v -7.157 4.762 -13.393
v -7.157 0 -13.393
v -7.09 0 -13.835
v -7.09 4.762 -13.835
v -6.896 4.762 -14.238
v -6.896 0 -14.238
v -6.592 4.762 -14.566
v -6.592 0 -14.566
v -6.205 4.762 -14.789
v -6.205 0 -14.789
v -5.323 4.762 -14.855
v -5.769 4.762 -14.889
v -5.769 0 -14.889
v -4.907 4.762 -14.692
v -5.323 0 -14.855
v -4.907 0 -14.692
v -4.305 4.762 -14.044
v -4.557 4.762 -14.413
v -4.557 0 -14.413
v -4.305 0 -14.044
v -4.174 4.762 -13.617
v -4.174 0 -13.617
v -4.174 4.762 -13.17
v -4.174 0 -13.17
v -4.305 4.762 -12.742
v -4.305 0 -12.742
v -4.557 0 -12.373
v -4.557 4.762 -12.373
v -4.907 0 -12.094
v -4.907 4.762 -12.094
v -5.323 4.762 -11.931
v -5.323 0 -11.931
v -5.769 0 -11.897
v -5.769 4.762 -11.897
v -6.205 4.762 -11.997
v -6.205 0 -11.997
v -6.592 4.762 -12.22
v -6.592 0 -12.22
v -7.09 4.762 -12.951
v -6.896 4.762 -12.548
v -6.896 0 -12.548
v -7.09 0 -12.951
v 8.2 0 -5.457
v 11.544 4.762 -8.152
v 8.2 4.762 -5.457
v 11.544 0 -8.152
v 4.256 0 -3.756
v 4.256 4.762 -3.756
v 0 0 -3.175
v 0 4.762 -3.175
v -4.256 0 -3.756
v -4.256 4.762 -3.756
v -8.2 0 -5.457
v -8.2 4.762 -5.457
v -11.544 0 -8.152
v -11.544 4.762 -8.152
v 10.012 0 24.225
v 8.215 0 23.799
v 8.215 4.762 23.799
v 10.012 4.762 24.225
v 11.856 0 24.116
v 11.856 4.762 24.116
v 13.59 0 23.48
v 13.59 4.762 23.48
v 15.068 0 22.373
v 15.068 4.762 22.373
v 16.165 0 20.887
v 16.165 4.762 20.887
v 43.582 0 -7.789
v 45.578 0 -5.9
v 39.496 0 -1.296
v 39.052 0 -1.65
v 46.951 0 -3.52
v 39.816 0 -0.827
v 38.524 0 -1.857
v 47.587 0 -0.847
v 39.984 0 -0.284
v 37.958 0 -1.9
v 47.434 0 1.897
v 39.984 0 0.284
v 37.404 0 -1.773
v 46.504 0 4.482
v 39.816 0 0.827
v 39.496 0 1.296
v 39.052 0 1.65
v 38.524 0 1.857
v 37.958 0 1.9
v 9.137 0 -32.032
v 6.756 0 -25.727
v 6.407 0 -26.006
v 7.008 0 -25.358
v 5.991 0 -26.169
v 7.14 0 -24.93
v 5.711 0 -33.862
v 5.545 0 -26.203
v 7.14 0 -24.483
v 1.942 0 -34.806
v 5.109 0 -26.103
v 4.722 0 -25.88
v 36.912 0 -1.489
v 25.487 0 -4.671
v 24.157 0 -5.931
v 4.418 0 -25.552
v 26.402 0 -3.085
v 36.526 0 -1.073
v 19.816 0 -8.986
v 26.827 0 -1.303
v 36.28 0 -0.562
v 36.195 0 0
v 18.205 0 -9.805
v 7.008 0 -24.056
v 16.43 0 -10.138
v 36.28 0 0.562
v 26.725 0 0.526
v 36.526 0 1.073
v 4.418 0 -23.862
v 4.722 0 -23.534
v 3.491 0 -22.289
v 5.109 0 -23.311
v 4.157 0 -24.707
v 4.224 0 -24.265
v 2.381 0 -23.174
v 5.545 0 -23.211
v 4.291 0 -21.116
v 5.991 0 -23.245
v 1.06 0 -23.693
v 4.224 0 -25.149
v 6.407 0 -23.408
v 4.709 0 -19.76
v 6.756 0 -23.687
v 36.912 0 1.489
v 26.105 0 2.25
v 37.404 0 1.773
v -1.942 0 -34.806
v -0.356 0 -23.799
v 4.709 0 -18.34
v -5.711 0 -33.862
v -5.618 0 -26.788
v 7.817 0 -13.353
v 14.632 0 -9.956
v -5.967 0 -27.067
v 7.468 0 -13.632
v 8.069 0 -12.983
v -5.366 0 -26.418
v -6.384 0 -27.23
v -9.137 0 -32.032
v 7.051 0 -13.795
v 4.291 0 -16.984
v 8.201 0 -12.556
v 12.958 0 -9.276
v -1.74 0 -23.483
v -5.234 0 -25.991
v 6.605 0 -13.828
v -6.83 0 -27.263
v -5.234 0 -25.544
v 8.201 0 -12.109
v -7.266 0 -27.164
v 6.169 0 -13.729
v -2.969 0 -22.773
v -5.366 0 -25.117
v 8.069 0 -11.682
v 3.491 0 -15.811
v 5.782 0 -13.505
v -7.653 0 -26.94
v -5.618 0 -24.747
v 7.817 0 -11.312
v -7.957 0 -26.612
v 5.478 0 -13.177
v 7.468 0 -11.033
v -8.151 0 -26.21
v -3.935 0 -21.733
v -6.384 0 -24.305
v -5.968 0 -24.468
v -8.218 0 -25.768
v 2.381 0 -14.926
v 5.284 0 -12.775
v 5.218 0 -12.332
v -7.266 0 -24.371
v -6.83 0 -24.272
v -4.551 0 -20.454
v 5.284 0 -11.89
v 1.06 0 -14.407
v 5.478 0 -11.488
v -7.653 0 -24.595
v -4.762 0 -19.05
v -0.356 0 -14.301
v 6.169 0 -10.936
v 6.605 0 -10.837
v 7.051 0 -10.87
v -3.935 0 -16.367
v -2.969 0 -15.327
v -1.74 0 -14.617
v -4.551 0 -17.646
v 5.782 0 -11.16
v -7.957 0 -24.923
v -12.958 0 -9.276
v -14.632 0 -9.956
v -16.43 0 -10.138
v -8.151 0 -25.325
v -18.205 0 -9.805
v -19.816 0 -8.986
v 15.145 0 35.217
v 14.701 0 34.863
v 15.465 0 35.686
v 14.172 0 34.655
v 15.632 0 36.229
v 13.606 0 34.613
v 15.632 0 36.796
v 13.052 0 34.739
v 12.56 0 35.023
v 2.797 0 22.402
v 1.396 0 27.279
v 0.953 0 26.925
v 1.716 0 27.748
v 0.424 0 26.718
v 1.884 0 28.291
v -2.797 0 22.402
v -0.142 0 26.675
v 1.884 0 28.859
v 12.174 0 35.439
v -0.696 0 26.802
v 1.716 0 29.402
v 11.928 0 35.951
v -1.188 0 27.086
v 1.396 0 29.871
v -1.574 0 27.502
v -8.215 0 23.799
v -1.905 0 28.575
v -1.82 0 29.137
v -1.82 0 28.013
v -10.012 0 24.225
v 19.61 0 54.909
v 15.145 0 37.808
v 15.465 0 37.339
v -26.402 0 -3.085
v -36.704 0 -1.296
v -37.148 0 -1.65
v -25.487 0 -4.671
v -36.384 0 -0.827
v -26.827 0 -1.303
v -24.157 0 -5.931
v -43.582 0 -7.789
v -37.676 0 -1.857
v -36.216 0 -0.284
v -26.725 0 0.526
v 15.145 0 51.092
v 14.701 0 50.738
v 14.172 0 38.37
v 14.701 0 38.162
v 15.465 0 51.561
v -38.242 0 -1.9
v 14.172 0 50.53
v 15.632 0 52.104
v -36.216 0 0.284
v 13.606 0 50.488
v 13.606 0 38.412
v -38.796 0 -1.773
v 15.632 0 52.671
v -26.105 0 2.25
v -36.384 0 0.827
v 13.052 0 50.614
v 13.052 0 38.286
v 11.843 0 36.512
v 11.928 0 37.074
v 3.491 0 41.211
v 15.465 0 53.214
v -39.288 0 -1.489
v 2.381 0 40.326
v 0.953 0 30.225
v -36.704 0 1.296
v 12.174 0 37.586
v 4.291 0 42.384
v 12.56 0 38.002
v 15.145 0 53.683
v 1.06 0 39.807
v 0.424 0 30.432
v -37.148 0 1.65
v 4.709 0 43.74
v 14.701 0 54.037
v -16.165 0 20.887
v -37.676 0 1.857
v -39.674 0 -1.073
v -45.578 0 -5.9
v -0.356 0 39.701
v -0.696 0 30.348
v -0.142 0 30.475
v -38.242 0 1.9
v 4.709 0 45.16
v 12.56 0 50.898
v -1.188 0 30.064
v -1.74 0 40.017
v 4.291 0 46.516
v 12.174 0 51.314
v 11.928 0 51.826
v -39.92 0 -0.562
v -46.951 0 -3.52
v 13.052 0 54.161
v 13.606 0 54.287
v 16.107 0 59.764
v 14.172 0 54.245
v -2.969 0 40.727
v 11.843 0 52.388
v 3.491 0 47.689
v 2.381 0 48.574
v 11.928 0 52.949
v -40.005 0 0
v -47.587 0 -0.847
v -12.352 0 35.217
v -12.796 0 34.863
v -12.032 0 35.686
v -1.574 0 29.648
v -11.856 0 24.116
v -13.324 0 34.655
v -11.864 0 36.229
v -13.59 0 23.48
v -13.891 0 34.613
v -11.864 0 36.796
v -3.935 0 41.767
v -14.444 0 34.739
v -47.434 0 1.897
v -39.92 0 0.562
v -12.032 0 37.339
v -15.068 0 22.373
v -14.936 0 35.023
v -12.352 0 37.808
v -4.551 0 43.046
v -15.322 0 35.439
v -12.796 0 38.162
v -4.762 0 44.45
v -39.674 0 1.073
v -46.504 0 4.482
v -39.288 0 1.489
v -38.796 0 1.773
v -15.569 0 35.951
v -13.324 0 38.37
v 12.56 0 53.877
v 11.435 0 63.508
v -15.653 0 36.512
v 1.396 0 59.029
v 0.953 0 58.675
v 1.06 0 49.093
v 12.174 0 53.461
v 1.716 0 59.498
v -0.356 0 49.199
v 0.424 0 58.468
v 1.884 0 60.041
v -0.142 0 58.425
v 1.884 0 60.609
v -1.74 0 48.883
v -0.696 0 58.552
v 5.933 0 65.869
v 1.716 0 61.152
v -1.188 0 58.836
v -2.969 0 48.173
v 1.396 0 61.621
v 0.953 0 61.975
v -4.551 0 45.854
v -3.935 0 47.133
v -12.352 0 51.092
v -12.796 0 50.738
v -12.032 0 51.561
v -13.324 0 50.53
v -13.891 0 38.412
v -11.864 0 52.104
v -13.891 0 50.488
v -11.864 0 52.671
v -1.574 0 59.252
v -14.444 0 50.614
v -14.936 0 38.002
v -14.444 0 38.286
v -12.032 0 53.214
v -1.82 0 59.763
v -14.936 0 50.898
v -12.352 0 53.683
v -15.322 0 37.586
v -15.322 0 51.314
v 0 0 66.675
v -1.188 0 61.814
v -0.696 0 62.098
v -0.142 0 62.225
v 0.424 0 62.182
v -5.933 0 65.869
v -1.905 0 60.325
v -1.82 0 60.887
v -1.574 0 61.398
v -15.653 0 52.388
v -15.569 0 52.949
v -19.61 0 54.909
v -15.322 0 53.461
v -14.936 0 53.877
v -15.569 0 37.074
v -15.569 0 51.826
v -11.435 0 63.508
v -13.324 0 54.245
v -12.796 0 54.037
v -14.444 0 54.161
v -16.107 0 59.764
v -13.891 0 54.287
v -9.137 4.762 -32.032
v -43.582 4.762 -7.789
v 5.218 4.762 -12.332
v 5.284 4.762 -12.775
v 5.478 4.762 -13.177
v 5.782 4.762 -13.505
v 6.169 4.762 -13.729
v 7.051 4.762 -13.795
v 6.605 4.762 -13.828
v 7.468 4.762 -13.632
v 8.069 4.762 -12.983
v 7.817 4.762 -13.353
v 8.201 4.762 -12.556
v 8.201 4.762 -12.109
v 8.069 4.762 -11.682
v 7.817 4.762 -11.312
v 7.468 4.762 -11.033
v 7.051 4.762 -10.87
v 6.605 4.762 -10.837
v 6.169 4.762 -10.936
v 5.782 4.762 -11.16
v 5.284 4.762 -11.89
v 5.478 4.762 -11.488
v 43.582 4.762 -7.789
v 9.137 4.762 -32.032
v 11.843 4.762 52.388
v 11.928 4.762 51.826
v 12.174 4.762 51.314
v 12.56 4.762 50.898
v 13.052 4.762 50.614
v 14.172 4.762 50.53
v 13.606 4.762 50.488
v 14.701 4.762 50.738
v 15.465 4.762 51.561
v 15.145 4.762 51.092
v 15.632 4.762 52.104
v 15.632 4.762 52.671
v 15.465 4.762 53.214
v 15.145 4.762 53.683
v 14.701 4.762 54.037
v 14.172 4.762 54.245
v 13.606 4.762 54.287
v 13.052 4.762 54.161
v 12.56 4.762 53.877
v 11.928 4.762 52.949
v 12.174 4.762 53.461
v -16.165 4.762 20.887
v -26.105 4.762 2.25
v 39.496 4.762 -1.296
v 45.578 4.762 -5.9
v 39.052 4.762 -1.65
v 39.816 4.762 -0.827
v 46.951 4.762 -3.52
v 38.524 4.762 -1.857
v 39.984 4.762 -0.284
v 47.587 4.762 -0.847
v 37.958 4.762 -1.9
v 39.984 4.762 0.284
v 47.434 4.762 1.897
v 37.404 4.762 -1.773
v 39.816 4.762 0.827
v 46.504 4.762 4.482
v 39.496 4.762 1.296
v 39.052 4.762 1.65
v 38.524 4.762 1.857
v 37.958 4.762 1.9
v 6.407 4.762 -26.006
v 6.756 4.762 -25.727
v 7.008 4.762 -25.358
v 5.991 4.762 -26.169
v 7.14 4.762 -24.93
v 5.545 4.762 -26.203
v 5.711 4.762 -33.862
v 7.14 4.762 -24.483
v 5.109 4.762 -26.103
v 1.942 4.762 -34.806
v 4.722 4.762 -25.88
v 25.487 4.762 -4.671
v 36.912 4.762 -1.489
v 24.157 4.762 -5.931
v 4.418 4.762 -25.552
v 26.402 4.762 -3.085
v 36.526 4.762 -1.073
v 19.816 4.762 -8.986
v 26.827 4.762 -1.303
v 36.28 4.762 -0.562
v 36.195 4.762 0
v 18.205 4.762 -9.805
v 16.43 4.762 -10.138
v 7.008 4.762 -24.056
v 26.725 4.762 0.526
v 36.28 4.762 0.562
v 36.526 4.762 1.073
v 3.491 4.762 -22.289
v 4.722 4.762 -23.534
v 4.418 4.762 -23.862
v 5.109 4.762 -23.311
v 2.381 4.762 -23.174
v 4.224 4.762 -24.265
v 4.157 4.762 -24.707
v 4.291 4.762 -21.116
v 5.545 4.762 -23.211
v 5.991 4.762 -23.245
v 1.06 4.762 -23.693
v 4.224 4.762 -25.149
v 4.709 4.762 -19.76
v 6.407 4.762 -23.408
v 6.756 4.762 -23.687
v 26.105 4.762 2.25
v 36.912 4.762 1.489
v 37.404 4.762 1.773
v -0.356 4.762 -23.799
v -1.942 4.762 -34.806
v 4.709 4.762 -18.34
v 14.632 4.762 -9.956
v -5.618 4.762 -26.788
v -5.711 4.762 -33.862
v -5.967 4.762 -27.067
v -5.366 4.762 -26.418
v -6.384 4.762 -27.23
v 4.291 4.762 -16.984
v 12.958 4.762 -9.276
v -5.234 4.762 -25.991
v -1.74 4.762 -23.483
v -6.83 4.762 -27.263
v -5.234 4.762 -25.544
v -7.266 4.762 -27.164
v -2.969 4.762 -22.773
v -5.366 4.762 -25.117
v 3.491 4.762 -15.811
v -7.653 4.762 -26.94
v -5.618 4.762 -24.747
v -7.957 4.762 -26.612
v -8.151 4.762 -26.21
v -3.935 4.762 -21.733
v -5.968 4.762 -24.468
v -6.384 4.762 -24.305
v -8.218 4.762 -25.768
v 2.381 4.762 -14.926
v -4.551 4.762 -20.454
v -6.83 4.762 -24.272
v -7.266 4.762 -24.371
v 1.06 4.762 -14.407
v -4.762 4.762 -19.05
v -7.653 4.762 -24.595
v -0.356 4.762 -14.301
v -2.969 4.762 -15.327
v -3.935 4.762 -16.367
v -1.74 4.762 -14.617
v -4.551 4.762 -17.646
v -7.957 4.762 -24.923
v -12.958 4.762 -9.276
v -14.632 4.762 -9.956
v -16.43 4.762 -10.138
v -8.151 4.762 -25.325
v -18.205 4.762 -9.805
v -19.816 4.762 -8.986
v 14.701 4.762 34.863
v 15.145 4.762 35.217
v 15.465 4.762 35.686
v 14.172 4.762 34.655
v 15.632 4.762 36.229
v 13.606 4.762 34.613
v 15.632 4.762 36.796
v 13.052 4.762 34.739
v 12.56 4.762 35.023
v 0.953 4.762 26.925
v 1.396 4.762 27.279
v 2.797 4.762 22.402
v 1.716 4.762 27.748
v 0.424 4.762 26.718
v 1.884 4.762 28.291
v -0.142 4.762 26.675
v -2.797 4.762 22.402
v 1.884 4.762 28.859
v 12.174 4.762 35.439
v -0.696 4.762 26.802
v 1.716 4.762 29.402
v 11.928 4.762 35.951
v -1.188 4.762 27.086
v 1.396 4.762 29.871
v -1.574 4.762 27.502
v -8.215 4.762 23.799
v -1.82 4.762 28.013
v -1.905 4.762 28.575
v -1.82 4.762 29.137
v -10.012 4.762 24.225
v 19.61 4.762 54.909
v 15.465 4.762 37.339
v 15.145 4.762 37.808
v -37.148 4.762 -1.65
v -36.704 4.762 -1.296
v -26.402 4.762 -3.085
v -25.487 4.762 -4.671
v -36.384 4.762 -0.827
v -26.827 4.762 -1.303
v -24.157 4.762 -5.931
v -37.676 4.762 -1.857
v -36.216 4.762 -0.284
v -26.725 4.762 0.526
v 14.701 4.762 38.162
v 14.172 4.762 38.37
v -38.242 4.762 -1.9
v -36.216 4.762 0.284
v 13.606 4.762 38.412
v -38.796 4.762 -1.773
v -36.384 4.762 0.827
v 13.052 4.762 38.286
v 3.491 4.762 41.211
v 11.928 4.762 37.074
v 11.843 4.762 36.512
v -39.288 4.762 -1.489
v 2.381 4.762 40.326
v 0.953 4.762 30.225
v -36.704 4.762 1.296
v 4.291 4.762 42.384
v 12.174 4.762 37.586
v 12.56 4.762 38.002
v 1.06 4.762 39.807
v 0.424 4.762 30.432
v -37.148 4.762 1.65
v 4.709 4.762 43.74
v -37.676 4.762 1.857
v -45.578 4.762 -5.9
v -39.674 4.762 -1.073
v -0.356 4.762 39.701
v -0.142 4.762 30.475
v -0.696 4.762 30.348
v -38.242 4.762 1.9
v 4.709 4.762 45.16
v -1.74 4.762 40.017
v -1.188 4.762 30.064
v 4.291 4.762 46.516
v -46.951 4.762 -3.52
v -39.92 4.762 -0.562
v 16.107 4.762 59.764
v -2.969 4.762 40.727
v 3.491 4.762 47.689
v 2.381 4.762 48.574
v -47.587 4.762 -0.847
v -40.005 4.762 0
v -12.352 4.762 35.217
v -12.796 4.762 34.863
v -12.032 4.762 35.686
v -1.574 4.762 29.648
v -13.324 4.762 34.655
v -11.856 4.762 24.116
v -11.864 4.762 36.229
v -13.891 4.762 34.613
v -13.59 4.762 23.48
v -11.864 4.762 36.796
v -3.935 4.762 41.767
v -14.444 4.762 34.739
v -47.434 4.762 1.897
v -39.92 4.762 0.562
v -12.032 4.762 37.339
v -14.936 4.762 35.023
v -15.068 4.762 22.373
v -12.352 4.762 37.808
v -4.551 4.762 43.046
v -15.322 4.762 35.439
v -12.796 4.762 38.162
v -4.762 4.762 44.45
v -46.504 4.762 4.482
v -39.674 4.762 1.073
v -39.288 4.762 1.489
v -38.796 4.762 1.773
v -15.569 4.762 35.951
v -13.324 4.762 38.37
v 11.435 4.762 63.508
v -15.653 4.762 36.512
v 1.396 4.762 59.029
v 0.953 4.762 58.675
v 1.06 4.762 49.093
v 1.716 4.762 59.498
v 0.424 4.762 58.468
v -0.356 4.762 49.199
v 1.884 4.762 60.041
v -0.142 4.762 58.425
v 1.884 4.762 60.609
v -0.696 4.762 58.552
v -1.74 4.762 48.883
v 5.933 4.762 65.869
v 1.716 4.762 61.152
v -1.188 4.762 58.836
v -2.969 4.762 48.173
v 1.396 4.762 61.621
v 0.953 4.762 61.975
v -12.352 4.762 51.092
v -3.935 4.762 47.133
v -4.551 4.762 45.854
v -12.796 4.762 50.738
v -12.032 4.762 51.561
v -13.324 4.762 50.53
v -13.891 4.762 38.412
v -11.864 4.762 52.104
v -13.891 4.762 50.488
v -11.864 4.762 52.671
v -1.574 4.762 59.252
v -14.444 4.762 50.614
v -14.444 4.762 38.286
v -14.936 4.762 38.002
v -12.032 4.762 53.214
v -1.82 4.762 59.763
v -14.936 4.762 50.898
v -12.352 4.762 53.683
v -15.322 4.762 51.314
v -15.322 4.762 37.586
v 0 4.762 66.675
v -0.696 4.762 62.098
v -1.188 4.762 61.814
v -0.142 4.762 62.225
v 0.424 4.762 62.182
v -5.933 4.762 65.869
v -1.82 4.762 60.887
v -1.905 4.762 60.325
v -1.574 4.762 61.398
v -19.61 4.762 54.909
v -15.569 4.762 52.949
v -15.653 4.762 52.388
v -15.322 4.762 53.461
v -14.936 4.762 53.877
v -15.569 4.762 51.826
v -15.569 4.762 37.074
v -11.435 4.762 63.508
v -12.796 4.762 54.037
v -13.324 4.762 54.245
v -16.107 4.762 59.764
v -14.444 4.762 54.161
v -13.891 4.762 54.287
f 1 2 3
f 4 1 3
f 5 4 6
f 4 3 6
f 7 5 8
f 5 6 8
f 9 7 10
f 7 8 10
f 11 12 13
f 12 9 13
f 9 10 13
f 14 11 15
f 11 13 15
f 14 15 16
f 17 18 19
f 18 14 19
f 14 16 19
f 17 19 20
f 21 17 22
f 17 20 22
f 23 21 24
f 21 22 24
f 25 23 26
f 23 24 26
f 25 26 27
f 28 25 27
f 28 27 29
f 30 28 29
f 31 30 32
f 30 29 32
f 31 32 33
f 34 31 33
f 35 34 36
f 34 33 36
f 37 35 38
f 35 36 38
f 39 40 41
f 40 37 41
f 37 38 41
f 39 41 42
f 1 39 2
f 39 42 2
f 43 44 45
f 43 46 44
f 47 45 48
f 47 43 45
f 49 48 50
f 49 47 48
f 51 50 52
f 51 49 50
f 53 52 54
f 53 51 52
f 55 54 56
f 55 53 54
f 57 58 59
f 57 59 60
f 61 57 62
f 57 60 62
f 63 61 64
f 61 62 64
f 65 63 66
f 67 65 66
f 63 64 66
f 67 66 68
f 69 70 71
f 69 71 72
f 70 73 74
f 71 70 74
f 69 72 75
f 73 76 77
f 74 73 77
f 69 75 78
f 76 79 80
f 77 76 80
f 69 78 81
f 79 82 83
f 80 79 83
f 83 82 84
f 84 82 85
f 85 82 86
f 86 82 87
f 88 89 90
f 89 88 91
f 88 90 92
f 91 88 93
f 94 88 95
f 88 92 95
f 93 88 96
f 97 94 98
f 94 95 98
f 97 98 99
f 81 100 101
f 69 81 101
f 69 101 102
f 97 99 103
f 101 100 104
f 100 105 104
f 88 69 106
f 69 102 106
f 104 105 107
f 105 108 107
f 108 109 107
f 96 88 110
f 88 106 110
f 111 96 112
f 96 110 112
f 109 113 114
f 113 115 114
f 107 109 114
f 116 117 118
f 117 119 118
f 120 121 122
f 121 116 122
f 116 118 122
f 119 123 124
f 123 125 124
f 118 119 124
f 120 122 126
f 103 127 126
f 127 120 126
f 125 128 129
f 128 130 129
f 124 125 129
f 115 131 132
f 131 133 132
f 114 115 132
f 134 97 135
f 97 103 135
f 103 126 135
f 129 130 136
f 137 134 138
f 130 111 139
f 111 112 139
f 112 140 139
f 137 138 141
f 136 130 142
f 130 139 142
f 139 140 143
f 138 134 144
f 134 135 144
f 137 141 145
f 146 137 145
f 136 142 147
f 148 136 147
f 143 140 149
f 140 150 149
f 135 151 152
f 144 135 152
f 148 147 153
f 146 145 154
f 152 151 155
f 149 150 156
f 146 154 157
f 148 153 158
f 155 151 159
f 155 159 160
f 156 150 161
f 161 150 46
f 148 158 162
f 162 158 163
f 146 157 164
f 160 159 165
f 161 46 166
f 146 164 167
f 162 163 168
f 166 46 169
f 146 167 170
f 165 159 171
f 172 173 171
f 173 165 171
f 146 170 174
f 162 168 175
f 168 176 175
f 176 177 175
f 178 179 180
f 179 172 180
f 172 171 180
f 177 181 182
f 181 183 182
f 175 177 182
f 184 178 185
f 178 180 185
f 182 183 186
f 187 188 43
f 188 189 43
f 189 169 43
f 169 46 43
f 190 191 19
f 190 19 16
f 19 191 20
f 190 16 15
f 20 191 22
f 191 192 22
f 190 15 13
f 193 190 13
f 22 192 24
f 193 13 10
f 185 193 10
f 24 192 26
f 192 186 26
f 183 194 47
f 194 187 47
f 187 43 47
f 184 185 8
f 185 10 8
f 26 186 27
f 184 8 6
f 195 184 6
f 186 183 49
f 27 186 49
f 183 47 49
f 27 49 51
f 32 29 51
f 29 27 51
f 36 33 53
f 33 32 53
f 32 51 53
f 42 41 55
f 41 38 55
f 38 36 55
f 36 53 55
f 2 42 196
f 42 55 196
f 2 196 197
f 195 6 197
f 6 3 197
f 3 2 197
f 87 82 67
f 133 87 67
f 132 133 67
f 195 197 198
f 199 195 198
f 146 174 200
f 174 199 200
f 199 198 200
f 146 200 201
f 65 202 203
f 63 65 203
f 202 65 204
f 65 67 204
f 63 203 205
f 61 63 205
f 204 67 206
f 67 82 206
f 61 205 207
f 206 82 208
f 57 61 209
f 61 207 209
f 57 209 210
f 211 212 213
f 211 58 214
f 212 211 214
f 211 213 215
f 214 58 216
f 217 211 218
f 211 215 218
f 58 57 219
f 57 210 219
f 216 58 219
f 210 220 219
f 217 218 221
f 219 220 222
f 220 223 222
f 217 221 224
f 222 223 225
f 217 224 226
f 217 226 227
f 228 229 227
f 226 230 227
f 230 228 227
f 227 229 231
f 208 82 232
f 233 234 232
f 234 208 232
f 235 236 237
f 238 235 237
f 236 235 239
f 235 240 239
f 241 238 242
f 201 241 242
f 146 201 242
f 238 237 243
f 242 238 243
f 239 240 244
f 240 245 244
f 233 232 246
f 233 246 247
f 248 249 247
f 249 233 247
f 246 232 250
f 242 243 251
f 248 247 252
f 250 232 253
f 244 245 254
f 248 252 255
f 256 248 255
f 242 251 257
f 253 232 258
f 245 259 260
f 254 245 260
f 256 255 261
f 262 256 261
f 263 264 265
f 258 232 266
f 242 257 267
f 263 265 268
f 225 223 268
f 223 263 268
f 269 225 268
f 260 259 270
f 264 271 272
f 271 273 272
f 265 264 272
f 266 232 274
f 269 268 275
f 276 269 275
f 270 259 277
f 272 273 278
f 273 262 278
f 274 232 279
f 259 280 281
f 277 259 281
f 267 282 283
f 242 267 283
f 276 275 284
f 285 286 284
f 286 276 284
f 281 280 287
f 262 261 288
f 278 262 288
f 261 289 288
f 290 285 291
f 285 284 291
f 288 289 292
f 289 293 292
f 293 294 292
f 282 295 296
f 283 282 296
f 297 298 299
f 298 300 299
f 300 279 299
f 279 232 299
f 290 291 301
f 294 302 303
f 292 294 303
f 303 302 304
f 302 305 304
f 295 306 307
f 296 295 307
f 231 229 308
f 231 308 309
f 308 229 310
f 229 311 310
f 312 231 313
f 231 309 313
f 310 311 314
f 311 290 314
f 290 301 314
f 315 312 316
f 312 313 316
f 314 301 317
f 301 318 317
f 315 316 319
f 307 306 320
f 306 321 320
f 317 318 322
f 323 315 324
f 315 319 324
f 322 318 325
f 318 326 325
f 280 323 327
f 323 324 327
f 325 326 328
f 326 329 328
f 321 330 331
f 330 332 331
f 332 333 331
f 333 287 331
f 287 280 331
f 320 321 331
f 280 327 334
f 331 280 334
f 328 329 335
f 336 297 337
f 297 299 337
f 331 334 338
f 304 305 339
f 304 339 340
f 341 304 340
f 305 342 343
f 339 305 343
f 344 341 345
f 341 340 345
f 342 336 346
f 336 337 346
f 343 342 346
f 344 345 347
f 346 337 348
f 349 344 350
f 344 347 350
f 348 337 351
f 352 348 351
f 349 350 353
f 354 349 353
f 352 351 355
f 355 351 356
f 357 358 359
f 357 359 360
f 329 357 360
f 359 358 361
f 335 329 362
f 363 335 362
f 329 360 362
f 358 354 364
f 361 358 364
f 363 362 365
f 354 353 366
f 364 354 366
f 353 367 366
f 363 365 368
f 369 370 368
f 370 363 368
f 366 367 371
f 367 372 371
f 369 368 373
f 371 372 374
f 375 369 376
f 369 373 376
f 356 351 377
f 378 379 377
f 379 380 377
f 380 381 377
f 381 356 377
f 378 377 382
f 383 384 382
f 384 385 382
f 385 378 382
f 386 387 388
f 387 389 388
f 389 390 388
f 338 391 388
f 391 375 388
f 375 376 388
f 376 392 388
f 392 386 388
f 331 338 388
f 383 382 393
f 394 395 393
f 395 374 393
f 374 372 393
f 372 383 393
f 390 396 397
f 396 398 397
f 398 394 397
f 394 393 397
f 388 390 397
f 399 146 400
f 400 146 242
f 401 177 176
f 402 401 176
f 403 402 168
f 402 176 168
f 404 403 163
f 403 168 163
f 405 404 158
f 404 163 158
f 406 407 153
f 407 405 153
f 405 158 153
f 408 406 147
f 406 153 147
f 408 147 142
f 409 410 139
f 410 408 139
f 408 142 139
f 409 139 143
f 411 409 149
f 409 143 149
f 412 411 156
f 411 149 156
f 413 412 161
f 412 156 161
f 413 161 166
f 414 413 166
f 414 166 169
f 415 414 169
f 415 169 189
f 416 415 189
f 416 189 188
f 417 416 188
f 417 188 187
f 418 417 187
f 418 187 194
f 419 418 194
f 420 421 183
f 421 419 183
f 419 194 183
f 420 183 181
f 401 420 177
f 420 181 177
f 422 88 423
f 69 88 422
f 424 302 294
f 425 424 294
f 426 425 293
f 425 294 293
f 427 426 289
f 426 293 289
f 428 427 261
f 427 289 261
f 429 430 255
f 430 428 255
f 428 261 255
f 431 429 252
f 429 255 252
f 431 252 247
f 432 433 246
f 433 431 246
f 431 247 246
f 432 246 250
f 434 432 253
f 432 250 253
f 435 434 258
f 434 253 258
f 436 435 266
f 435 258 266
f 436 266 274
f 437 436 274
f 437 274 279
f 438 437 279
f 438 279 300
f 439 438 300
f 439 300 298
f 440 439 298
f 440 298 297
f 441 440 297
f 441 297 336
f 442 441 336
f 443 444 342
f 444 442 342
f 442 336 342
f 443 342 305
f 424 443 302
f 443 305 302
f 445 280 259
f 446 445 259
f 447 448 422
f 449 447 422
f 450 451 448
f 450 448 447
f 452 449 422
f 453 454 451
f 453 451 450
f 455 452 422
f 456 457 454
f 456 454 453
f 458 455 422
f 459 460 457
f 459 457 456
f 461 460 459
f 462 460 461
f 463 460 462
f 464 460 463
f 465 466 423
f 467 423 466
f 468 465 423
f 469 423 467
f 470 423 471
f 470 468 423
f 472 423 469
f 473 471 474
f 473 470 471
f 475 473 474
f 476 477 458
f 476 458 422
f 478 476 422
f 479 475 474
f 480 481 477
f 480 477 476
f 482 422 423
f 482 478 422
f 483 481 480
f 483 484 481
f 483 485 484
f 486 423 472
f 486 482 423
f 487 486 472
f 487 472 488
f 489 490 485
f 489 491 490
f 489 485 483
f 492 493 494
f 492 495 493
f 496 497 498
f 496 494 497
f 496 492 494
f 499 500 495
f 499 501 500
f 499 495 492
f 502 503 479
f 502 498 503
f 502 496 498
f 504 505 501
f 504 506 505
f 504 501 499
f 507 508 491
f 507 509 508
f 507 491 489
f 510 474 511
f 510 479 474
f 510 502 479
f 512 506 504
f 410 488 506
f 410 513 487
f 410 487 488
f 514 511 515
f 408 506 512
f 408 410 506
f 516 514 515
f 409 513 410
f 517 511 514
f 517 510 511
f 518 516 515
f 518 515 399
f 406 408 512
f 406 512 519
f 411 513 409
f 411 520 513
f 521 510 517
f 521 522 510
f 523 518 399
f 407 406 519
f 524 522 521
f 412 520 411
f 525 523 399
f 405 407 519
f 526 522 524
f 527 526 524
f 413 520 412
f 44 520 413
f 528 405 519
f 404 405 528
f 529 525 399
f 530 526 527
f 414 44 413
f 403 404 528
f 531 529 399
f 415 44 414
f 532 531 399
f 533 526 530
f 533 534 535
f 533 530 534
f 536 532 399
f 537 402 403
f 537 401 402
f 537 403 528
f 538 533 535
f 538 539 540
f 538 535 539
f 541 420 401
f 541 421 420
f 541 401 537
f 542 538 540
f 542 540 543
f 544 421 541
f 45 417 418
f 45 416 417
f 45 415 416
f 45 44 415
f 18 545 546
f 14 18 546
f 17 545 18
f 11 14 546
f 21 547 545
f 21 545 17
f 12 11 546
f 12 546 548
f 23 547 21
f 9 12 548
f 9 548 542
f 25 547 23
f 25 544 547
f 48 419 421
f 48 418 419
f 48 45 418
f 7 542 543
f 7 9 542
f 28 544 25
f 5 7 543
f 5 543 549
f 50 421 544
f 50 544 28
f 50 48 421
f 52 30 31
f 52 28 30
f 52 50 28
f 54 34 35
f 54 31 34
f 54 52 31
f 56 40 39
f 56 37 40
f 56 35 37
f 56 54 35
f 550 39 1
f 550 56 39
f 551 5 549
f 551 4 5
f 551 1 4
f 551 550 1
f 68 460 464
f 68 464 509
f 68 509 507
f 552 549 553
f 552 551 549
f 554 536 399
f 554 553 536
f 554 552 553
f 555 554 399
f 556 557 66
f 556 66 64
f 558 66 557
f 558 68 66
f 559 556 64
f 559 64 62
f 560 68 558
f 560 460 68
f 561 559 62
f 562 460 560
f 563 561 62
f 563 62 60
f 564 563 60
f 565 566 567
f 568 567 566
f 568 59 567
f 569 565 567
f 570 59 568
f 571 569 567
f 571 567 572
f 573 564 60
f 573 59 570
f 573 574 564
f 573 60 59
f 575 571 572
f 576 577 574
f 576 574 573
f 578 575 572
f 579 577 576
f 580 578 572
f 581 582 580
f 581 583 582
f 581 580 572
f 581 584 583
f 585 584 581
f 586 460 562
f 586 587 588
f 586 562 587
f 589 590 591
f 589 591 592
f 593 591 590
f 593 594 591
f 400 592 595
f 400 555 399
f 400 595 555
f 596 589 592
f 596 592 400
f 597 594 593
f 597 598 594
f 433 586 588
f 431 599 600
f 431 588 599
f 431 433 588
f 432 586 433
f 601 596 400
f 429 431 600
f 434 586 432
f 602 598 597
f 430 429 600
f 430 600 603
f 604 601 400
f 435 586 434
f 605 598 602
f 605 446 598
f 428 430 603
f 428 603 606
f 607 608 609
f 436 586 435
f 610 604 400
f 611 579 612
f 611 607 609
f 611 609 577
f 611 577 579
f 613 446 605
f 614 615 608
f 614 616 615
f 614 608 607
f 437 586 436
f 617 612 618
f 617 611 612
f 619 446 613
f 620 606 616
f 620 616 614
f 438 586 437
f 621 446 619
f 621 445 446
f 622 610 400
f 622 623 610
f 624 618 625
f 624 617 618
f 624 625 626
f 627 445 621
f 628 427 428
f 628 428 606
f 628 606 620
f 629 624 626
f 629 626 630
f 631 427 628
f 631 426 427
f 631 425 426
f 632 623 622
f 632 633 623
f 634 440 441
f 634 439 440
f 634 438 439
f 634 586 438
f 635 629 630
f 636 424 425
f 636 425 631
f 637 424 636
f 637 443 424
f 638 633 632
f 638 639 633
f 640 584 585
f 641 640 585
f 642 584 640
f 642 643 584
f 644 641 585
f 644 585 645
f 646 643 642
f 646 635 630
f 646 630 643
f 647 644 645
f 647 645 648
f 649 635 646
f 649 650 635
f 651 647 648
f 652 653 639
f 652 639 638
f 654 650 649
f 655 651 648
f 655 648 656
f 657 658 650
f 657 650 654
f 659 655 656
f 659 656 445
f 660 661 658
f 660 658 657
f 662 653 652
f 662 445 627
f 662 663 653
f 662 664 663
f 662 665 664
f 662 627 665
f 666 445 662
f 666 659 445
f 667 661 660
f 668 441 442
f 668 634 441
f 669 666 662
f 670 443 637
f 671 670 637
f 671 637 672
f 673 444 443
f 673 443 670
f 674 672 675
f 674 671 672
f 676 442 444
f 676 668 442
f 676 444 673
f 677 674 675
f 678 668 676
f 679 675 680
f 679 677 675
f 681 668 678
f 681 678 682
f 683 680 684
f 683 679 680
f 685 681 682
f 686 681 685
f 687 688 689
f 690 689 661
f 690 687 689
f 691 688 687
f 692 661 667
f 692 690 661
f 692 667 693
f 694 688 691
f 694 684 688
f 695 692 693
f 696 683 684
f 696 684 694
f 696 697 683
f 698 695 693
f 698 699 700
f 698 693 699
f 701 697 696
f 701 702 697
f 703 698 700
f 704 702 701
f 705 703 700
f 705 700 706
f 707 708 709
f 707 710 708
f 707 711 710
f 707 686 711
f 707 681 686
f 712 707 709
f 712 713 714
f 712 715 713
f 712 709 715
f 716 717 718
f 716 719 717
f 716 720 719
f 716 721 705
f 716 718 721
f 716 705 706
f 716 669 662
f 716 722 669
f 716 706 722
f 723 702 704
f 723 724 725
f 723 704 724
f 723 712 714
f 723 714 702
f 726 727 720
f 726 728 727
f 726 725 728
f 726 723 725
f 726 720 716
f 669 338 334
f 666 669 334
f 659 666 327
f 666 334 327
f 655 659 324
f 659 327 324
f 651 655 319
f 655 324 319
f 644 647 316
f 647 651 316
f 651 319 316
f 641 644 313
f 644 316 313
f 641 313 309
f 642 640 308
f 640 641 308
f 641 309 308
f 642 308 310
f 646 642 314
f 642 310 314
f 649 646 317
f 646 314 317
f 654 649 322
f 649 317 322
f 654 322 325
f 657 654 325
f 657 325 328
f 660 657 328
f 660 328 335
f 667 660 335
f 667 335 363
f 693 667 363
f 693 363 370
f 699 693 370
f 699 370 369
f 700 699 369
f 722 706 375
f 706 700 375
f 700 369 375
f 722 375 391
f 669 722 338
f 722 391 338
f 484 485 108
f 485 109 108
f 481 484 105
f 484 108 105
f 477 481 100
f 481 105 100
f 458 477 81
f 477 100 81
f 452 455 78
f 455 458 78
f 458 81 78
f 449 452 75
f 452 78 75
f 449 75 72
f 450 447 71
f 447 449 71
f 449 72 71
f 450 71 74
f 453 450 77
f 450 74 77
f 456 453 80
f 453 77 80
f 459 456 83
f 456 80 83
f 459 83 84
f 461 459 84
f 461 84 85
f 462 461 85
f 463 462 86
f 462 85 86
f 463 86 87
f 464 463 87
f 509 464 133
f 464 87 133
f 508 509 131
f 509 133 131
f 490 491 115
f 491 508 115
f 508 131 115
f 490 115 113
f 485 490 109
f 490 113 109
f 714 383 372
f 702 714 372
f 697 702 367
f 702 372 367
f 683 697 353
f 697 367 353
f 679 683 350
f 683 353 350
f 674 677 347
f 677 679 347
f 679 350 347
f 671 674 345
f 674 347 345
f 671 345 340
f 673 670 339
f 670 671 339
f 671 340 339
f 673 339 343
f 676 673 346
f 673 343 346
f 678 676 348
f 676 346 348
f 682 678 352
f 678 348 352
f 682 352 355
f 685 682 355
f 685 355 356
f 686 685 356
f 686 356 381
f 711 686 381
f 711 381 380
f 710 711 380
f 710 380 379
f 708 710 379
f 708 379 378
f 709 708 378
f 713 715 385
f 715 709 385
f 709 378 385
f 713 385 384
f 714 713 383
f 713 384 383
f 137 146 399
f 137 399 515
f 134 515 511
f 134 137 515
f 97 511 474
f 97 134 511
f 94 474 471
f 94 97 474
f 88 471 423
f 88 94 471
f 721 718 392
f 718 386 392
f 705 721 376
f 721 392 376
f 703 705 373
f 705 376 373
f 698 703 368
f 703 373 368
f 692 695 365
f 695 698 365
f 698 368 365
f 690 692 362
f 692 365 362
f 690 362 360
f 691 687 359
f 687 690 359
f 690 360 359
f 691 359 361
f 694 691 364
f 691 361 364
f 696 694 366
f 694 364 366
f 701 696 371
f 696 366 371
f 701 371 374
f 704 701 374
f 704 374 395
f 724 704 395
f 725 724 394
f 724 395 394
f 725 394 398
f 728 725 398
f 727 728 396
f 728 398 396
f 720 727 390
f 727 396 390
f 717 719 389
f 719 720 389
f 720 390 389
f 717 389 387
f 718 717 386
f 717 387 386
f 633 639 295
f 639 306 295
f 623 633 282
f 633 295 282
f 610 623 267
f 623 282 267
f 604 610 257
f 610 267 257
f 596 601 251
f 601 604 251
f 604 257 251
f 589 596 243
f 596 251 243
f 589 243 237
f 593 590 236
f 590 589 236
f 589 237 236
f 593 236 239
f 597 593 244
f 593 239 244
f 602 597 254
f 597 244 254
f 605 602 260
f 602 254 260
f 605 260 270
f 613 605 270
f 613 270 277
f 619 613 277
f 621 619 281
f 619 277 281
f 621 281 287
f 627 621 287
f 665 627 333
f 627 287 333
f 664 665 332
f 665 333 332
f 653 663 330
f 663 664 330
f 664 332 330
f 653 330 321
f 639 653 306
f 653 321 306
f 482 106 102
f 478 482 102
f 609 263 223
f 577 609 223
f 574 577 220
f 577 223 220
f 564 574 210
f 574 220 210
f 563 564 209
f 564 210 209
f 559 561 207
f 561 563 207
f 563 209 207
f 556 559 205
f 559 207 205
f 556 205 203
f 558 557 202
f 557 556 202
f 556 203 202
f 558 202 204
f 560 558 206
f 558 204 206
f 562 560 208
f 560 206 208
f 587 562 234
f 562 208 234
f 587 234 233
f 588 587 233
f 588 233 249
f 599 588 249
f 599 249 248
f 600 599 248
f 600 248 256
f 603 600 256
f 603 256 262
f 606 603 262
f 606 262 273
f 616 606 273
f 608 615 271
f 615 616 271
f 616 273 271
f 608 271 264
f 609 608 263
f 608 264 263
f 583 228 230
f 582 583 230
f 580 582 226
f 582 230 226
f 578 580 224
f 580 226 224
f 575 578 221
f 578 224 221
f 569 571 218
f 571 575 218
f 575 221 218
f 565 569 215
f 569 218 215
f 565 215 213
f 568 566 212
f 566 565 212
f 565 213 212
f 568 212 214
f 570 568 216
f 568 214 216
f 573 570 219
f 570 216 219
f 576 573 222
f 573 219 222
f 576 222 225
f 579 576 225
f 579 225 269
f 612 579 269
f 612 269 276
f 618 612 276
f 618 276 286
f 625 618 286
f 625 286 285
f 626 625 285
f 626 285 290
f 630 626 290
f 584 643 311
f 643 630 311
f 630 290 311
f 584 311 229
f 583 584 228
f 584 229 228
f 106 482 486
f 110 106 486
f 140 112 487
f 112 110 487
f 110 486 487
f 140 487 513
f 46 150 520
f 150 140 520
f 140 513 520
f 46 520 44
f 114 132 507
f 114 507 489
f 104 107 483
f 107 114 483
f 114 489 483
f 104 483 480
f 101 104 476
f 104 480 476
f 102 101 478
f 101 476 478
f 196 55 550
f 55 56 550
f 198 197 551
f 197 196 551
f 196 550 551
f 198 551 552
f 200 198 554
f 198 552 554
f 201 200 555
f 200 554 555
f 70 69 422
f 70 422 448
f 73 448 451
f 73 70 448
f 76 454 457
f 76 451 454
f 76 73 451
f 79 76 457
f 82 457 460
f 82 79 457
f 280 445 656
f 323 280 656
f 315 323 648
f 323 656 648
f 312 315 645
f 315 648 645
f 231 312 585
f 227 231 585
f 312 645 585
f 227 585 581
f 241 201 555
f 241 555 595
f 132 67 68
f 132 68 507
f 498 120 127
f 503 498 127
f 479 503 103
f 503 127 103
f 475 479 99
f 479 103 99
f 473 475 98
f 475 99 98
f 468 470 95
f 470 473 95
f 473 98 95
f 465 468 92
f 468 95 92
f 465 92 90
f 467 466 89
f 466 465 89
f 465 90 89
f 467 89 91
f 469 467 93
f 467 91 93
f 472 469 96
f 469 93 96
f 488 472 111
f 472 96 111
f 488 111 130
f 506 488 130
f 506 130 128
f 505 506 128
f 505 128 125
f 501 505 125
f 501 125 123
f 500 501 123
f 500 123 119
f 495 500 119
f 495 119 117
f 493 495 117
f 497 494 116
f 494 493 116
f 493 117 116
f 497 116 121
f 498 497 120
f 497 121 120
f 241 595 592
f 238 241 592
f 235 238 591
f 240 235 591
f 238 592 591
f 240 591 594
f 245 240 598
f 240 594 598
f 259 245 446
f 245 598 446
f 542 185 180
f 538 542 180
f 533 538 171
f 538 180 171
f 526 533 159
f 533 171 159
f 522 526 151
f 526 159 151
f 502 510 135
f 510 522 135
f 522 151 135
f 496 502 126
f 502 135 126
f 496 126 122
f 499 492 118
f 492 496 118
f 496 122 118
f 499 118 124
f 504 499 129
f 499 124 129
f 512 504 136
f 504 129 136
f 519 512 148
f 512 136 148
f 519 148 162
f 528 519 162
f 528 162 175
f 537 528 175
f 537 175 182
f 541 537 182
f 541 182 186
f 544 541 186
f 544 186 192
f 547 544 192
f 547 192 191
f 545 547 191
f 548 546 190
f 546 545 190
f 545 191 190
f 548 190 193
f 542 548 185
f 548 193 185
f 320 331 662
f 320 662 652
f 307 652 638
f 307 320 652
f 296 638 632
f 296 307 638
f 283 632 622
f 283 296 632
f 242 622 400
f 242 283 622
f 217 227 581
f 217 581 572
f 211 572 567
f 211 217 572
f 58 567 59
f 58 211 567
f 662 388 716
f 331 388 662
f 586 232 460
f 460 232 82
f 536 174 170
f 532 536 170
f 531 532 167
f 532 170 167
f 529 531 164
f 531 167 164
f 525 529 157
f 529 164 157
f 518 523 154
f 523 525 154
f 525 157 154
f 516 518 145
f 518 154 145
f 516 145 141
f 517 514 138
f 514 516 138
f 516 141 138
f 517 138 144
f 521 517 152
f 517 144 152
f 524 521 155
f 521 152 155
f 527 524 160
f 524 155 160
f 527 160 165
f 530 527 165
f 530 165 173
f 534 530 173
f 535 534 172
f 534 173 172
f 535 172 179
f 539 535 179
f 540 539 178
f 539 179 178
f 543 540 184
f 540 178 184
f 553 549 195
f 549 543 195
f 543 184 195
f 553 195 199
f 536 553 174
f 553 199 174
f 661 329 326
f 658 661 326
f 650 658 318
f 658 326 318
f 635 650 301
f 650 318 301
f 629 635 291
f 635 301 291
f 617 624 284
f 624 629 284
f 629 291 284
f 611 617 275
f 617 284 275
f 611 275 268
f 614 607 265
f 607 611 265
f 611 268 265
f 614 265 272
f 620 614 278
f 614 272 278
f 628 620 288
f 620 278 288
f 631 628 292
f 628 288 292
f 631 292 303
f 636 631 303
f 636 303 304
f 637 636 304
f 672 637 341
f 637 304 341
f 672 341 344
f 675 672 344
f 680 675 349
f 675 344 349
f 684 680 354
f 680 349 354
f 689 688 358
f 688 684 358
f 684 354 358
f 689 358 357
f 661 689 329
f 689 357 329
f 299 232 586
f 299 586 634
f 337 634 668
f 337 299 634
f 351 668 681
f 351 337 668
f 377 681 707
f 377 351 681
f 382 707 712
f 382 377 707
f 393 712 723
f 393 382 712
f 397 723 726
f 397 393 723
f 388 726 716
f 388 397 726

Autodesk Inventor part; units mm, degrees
ref_plane "YZ Plane" through (0, 0, 0) normal (1, 0, 0) x (0, 1, 0)
ref_plane "XZ Plane" through (0, 0, 0) normal (0, 1, 0) x (-1, 0, 0)
ref_plane "XY Plane" through (0, 0, 0) normal (0, 0, 1) x (1, 0, 0)
sketch "Sketch1" plane through (0, 0, 0) normal (0, 1, 0) x (-1, 0, 0)
  circle A0 centre (0, 0) radius 38.1 construction
  line L0 (0, 0) -> (38.1, 0) construction
  line L1 (0, 0) -> (-38.1, 0) construction
  circle A1 centre (38.1, 0) radius 1.905
  circle A2 centre (-38.1, 0) radius 1.905
  circle A3 centre (38.1, 0) radius 9.525
  circle A4 centre (-38.1, 0) radius 9.525
  line L2 (0, 0) -> (0, 44.45) construction
  circle A5 centre (0, 44.45) radius 76.2 construction
  circle A6 centre (0, 44.45) radius 19.05 construction
  circle A7 centre (0, 0) radius 25.4 construction
  circle A8 centre (0, 44.45) radius 4.7625
  circle A9 centre (0, 44.45) radius 22.225
  line L3 (19.6103, 54.9088) -> (46.5044, 4.4824)
  line L4 (-19.6103, 54.9088) -> (-46.5044, 4.4824)
  line L5 (13.153, 26.535) -> (29.6956, -4.4824)
  line L6 (-13.153, 26.535) -> (-29.6956, -4.4824)
  circle A10 centre (0, 44.45) radius 15.875 construction
  circle A11 centre (0, 60.325) radius 1.905
  circle A12 centre (-13.7482, 52.3875) radius 1.905
  circle A13 centre (-13.7482, 36.5125) radius 1.905
  circle A14 centre (0, 28.575) radius 1.905
  circle A15 centre (13.7482, 36.5125) radius 1.905
  circle A16 centre (13.7482, 52.3875) radius 1.905
  circle A17 centre (0, -19.05) radius 4.7625
  circle A18 centre (0, -19.05) radius 8 construction
  circle A19 centre (0, -19.05) radius 9.5 construction
  line L7 (0, -19.05) -> (9.5, -19.05) construction
  line L8 (0, -19.05) -> (6.7175, -12.3325) construction
  circle A20 centre (5.6569, -13.3931) radius 1.5
  line L9 (0, -19.05) -> (6.7175, -25.7675) construction
  circle A21 centre (6.7175, -25.7675) radius 1.5
  circle A22 centre (-6.7175, -12.3325) radius 1.5
  circle A23 centre (-5.6569, -24.7069) radius 1.5
  circle A24 centre (0, -19.05) radius 15.875
  line L10 (9.1369, -32.032) -> (43.5821, -7.7892)
  line L11 (14.5471, -12.6942) -> (28.7456, -2.7012)
  line L12 (-9.1369, -32.032) -> (-43.5821, -7.7892)
  line L13 (-14.5471, -12.6942) -> (-28.7456, -2.7012)
  point P0 (-29.6956, -4.4824)
  point P1 (29.6956, -4.4824)
  dimension "d14" = 31.75
  dimension "d22" = 16
  dimension "d0" = 76.2
  dimension "d1" = 3.81
  dimension "d2" = 3.81
  dimension "d3" = 19.05
  dimension "d4" = 19.05
  dimension "d5" = 152.4
  dimension "d6" = 38.1
  dimension "d7" = 50.8
  dimension "d8" = 9.525
  dimension "d9" = 44.45
  dimension "d10" = 19.05
  dimension "d15" = 3.81
  dimension "d18" = 360
  dimension "d20" = 9.525
  dimension "d21" = 63.5
  dimension "d23" = 19
  dimension "d24" = 45
  dimension "d25" = 3
  dimension "d26" = 3
  dimension "d29" = 360
  dimension "d31" = 31.75
  dimension "d32" = 12.7
extrude "Extrusion1" add sketch "Sketch1" along normal blind 4.7625 contours A3 | A3 L5 A9 L3 | L10 A24 L11 L5 A3 | A9 | A24 | A9 L6 A4 L4 | L12 A4 L6 L13 A24 | A4
fillet "Fillet1" radius 6.35 6 edges at (-13.153, 2.3813, 26.535) (13.153, 2.3813, 26.535) (-14.5471, 2.3813, -12.6942) (-28.7456, 2.3813, -2.7012) (14.5471, 2.3813, -12.6942) (28.7456, 2.3813, -2.7012)
equation "\"d2\" = d1"
equation "\"d4\" = d3"
properties part number "Upright - Bottom" material "Aluminum 6061"
